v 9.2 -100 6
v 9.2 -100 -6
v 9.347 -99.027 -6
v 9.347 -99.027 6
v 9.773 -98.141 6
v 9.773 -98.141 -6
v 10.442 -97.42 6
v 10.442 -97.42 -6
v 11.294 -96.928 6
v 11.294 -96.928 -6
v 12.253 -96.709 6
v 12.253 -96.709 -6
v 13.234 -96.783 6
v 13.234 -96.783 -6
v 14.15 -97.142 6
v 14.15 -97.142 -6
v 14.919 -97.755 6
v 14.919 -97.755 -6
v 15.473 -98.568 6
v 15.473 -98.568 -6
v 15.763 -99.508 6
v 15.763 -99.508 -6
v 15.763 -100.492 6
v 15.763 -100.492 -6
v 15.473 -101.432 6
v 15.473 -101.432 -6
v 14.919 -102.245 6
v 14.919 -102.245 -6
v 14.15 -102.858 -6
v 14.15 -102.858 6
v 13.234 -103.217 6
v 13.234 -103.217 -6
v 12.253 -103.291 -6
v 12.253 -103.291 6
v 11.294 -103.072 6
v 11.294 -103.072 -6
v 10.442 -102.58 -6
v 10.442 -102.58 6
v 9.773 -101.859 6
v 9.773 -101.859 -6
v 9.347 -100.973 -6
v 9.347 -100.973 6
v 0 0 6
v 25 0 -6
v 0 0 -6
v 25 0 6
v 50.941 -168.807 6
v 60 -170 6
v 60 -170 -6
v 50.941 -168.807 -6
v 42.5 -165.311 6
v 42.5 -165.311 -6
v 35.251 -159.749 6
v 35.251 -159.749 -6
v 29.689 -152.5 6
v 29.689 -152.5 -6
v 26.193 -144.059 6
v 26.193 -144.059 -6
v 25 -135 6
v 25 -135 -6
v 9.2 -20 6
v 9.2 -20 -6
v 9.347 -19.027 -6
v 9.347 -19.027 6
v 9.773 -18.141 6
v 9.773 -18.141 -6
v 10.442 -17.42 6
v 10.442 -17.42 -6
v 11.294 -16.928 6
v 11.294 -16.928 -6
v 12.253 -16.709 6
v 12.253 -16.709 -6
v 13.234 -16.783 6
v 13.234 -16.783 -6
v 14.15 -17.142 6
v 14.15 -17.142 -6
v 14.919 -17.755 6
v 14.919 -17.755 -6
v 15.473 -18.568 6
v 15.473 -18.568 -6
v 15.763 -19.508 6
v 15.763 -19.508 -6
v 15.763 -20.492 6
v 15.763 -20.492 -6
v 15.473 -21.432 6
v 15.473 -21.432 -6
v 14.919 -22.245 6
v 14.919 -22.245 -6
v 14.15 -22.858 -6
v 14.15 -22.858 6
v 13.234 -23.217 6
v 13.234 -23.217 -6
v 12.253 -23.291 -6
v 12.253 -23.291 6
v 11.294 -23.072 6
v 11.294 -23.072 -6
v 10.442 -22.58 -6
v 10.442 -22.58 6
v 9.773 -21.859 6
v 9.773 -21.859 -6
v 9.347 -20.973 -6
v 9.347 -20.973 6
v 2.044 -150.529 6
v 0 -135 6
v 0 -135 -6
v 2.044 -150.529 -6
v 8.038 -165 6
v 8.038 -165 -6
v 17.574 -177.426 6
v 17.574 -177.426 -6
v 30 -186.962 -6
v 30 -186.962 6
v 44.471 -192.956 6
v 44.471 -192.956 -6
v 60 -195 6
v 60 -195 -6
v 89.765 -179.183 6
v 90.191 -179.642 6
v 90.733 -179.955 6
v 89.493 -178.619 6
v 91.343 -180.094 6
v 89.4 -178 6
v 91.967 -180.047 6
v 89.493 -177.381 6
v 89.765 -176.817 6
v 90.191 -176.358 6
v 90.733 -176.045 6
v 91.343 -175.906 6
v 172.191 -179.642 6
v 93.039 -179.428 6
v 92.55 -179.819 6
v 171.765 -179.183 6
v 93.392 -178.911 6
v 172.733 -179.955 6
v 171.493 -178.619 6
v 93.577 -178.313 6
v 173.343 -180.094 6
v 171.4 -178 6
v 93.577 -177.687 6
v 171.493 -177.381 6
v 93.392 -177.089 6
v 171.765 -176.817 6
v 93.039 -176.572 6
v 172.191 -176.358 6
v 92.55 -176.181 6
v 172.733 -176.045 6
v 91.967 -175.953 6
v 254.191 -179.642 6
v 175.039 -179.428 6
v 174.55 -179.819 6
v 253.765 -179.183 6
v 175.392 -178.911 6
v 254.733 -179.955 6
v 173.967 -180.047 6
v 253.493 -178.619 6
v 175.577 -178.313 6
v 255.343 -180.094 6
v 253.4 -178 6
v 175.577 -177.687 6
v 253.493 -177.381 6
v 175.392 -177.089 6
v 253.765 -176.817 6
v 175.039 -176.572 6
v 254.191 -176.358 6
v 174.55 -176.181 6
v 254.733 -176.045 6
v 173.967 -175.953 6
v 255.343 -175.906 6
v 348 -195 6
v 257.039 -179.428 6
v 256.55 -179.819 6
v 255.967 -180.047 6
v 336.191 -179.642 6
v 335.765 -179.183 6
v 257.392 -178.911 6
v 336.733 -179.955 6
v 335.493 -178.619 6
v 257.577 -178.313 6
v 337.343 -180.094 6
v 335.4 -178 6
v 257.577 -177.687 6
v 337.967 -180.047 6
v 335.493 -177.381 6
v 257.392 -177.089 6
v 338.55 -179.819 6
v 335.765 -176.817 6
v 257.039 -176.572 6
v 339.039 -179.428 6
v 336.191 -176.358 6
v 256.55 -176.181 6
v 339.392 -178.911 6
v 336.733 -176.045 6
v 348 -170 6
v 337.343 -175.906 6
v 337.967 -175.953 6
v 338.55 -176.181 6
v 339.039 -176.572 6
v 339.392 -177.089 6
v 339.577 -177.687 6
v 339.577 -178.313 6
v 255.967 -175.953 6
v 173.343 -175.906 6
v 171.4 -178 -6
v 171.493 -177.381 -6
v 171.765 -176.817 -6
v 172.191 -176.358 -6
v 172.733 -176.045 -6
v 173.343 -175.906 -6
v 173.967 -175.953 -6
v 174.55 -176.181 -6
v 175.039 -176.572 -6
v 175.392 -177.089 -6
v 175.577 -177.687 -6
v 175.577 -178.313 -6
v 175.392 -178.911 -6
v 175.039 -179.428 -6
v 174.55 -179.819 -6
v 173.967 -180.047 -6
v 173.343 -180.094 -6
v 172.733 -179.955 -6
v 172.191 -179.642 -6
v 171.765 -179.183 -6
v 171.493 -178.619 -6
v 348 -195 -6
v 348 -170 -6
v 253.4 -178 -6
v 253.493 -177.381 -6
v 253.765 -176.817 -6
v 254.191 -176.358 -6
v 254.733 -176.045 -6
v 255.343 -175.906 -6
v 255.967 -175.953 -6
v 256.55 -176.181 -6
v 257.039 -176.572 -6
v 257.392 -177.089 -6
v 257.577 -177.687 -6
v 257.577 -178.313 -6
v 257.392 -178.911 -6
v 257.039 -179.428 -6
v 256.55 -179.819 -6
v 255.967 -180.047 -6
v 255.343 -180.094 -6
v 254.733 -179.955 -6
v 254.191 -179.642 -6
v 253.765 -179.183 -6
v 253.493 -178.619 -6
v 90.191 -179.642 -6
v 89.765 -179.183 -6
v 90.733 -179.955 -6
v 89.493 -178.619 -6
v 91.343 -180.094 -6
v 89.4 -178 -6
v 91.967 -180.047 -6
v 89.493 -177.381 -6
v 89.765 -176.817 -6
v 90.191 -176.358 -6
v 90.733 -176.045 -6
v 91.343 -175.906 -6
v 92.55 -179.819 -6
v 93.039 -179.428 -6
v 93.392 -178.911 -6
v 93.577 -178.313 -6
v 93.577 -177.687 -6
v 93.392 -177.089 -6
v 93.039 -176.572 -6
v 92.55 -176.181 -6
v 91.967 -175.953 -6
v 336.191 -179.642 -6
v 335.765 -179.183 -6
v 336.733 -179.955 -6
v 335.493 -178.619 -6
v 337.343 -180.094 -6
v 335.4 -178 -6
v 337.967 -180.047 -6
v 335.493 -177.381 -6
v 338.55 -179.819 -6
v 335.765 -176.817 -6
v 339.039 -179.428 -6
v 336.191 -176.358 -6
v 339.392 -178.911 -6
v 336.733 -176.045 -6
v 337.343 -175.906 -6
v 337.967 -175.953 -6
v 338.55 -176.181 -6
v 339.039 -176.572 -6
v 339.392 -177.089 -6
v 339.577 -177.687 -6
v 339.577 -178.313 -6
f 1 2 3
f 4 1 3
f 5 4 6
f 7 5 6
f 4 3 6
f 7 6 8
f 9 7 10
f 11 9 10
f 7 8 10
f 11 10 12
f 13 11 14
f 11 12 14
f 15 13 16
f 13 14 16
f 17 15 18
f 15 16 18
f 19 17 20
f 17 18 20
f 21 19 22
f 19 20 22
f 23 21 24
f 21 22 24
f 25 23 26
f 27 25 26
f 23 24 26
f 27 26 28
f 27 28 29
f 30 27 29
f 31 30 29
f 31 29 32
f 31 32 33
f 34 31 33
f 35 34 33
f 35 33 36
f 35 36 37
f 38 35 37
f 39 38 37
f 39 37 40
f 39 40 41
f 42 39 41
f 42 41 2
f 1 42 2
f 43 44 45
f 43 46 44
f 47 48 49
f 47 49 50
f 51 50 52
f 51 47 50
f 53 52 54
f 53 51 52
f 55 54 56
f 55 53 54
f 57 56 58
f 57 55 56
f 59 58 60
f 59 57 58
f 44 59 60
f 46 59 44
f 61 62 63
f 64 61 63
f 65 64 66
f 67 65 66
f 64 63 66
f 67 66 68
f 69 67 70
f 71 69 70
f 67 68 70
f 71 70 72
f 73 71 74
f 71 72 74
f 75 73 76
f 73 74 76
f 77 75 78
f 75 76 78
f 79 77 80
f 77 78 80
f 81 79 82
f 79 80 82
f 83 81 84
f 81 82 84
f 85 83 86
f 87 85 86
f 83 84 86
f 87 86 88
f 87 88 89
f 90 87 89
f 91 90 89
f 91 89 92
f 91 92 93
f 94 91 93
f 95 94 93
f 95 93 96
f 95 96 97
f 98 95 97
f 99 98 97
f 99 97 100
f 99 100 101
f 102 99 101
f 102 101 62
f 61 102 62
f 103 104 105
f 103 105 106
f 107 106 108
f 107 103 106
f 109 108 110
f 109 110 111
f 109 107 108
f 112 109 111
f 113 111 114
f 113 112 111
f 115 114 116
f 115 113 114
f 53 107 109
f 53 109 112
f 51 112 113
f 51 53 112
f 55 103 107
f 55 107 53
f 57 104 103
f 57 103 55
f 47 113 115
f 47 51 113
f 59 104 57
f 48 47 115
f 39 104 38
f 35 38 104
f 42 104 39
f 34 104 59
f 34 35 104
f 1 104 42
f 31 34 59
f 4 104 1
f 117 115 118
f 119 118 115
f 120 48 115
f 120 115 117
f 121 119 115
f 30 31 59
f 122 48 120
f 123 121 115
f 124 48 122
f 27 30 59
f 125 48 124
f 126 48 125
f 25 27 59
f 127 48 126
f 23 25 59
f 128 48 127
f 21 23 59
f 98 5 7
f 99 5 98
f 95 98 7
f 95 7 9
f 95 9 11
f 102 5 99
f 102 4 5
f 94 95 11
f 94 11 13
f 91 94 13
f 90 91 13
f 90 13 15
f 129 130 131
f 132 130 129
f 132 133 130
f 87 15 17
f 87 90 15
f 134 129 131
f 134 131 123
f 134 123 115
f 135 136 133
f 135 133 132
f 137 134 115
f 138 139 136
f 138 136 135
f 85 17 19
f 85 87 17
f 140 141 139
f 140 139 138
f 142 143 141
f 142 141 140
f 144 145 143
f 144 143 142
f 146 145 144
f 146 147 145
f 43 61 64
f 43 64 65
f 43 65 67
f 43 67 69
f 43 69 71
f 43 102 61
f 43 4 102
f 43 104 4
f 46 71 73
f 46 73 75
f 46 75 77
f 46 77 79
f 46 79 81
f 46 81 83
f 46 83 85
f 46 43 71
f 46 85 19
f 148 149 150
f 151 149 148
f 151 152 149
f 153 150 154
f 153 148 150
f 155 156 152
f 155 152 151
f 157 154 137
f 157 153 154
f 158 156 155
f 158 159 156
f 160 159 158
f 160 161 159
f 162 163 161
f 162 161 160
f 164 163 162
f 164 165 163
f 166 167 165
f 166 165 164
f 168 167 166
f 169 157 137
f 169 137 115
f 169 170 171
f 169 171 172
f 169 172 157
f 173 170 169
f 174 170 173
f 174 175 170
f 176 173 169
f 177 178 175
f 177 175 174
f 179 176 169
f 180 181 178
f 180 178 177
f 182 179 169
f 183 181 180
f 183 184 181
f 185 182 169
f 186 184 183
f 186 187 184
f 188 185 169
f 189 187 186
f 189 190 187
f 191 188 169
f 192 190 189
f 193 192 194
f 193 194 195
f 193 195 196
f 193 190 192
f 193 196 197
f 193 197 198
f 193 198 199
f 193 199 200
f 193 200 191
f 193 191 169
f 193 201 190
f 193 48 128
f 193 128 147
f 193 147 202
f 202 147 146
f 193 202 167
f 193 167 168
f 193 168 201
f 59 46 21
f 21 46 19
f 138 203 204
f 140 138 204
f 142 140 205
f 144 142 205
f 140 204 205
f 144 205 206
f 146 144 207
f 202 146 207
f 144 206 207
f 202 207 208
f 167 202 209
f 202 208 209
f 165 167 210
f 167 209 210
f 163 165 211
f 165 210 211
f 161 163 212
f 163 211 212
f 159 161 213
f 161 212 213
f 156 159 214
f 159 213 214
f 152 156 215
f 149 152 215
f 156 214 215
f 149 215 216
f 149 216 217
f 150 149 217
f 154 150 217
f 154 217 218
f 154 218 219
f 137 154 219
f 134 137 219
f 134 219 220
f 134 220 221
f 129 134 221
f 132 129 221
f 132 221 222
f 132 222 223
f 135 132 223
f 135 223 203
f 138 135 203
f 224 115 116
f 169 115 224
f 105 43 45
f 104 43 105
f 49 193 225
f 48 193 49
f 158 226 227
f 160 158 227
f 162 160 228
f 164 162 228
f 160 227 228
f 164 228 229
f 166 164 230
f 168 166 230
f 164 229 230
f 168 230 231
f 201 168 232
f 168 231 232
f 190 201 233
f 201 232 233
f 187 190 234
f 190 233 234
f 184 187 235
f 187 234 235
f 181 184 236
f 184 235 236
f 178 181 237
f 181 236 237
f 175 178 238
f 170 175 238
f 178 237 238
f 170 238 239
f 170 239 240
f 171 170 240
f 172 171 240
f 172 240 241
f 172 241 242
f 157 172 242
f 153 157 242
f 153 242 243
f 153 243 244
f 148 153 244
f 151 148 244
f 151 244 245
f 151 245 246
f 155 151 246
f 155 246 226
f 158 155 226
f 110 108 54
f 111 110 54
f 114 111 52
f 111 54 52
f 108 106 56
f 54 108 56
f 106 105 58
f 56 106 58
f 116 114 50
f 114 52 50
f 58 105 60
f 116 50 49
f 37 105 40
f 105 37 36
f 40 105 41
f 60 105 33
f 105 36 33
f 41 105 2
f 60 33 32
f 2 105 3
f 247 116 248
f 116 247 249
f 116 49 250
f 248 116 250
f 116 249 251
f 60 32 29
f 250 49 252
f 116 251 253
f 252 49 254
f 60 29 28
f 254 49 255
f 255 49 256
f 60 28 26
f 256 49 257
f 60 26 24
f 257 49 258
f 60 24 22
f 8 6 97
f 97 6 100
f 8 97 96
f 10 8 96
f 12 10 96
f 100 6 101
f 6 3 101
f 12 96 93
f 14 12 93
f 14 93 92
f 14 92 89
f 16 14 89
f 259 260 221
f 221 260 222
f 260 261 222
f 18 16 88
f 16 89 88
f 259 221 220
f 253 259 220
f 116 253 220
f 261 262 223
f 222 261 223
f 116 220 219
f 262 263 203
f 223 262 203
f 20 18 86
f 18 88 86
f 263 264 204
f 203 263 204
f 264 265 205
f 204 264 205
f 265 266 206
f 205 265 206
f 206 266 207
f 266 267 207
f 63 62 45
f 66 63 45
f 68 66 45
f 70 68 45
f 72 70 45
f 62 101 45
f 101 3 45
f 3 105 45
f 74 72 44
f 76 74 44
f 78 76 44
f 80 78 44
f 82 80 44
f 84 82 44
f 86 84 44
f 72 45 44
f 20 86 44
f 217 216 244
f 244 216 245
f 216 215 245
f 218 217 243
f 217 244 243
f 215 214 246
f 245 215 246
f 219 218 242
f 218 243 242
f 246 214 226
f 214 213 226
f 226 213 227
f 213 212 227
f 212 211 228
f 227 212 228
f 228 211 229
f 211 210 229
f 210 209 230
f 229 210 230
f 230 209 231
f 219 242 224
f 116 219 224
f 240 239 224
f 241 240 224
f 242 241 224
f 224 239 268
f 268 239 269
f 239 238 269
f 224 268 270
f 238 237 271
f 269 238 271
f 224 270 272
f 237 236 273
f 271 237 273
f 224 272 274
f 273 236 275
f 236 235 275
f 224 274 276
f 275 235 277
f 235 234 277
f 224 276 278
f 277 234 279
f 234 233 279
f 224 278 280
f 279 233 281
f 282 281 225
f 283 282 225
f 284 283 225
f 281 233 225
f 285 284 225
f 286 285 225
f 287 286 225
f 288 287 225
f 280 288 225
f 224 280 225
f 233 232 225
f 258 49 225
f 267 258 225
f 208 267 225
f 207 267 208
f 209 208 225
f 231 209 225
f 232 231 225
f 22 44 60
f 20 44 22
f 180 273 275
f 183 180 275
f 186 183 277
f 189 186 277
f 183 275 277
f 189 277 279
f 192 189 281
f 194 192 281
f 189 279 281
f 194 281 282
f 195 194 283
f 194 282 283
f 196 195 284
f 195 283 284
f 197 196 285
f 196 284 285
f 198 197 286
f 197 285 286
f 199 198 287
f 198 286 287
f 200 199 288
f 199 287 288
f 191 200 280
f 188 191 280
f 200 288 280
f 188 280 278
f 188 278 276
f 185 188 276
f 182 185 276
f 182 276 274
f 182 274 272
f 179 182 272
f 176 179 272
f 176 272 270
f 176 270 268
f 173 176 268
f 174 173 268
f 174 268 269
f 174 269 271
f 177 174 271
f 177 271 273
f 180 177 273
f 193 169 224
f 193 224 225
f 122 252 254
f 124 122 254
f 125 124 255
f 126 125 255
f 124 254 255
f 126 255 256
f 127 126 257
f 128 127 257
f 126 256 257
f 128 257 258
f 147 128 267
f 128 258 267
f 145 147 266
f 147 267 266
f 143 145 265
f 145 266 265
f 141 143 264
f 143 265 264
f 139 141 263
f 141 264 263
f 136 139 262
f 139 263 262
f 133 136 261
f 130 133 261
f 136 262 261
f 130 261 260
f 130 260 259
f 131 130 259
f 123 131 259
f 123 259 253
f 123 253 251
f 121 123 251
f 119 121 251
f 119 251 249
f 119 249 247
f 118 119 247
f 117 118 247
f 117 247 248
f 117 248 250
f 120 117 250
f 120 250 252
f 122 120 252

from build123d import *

# Parameters (mm, degrees)
BOSS_EXTRUDE1_DEPTH  = 6
M6_CLEARANCE_HOLE1_D = 6.6
M5_TAPPED_HOLE1_D    = 4.2
LPATTERN1_COUNT      = 4
LPATTERN1_PITCH      = 82


with BuildPart() as part:
    # Sketch1 → Boss-Extrude1 (new body, symmetric)
    with BuildSketch(Plane.XY):
        with BuildLine():
            Line((0, 0), (0, -135))
            ThreePointArc((0, -135), (17.573593129, -177.426406871), (60, -195))
            Line((60, -195), (348, -195))
            Line((348, -195), (348, -170))
            Line((348, -170), (60, -170))
            ThreePointArc((60, -170), (35.251262658, -159.748737342), (25, -135))
            Line((25, -135), (25, 0))
            Line((25, 0), (0, 0))
        make_face()
    extrude(amount=BOSS_EXTRUDE1_DEPTH, both=True)

    # M6 Clearance Hole1 (through all)
    with Locations(Plane.XY.offset(6)):
        with Locations((12.5, -20), (12.5, -100)):
            Hole(M6_CLEARANCE_HOLE1_D / 2)

    # M5 Tapped Hole1 (through all)
    with Locations(Plane.XY.offset(6)):
        with Locations((337.5, -178)):
            m5_tapped_hole1 = Hole(M5_TAPPED_HOLE1_D / 2)

    # LPattern1: M5 Tapped Hole1 ×4
    with Locations(*[(-i * LPATTERN1_PITCH, 0, 0) for i in range(1, LPATTERN1_COUNT)]):
        add(m5_tapped_hole1, mode=Mode.SUBTRACT)


solid = part.part
